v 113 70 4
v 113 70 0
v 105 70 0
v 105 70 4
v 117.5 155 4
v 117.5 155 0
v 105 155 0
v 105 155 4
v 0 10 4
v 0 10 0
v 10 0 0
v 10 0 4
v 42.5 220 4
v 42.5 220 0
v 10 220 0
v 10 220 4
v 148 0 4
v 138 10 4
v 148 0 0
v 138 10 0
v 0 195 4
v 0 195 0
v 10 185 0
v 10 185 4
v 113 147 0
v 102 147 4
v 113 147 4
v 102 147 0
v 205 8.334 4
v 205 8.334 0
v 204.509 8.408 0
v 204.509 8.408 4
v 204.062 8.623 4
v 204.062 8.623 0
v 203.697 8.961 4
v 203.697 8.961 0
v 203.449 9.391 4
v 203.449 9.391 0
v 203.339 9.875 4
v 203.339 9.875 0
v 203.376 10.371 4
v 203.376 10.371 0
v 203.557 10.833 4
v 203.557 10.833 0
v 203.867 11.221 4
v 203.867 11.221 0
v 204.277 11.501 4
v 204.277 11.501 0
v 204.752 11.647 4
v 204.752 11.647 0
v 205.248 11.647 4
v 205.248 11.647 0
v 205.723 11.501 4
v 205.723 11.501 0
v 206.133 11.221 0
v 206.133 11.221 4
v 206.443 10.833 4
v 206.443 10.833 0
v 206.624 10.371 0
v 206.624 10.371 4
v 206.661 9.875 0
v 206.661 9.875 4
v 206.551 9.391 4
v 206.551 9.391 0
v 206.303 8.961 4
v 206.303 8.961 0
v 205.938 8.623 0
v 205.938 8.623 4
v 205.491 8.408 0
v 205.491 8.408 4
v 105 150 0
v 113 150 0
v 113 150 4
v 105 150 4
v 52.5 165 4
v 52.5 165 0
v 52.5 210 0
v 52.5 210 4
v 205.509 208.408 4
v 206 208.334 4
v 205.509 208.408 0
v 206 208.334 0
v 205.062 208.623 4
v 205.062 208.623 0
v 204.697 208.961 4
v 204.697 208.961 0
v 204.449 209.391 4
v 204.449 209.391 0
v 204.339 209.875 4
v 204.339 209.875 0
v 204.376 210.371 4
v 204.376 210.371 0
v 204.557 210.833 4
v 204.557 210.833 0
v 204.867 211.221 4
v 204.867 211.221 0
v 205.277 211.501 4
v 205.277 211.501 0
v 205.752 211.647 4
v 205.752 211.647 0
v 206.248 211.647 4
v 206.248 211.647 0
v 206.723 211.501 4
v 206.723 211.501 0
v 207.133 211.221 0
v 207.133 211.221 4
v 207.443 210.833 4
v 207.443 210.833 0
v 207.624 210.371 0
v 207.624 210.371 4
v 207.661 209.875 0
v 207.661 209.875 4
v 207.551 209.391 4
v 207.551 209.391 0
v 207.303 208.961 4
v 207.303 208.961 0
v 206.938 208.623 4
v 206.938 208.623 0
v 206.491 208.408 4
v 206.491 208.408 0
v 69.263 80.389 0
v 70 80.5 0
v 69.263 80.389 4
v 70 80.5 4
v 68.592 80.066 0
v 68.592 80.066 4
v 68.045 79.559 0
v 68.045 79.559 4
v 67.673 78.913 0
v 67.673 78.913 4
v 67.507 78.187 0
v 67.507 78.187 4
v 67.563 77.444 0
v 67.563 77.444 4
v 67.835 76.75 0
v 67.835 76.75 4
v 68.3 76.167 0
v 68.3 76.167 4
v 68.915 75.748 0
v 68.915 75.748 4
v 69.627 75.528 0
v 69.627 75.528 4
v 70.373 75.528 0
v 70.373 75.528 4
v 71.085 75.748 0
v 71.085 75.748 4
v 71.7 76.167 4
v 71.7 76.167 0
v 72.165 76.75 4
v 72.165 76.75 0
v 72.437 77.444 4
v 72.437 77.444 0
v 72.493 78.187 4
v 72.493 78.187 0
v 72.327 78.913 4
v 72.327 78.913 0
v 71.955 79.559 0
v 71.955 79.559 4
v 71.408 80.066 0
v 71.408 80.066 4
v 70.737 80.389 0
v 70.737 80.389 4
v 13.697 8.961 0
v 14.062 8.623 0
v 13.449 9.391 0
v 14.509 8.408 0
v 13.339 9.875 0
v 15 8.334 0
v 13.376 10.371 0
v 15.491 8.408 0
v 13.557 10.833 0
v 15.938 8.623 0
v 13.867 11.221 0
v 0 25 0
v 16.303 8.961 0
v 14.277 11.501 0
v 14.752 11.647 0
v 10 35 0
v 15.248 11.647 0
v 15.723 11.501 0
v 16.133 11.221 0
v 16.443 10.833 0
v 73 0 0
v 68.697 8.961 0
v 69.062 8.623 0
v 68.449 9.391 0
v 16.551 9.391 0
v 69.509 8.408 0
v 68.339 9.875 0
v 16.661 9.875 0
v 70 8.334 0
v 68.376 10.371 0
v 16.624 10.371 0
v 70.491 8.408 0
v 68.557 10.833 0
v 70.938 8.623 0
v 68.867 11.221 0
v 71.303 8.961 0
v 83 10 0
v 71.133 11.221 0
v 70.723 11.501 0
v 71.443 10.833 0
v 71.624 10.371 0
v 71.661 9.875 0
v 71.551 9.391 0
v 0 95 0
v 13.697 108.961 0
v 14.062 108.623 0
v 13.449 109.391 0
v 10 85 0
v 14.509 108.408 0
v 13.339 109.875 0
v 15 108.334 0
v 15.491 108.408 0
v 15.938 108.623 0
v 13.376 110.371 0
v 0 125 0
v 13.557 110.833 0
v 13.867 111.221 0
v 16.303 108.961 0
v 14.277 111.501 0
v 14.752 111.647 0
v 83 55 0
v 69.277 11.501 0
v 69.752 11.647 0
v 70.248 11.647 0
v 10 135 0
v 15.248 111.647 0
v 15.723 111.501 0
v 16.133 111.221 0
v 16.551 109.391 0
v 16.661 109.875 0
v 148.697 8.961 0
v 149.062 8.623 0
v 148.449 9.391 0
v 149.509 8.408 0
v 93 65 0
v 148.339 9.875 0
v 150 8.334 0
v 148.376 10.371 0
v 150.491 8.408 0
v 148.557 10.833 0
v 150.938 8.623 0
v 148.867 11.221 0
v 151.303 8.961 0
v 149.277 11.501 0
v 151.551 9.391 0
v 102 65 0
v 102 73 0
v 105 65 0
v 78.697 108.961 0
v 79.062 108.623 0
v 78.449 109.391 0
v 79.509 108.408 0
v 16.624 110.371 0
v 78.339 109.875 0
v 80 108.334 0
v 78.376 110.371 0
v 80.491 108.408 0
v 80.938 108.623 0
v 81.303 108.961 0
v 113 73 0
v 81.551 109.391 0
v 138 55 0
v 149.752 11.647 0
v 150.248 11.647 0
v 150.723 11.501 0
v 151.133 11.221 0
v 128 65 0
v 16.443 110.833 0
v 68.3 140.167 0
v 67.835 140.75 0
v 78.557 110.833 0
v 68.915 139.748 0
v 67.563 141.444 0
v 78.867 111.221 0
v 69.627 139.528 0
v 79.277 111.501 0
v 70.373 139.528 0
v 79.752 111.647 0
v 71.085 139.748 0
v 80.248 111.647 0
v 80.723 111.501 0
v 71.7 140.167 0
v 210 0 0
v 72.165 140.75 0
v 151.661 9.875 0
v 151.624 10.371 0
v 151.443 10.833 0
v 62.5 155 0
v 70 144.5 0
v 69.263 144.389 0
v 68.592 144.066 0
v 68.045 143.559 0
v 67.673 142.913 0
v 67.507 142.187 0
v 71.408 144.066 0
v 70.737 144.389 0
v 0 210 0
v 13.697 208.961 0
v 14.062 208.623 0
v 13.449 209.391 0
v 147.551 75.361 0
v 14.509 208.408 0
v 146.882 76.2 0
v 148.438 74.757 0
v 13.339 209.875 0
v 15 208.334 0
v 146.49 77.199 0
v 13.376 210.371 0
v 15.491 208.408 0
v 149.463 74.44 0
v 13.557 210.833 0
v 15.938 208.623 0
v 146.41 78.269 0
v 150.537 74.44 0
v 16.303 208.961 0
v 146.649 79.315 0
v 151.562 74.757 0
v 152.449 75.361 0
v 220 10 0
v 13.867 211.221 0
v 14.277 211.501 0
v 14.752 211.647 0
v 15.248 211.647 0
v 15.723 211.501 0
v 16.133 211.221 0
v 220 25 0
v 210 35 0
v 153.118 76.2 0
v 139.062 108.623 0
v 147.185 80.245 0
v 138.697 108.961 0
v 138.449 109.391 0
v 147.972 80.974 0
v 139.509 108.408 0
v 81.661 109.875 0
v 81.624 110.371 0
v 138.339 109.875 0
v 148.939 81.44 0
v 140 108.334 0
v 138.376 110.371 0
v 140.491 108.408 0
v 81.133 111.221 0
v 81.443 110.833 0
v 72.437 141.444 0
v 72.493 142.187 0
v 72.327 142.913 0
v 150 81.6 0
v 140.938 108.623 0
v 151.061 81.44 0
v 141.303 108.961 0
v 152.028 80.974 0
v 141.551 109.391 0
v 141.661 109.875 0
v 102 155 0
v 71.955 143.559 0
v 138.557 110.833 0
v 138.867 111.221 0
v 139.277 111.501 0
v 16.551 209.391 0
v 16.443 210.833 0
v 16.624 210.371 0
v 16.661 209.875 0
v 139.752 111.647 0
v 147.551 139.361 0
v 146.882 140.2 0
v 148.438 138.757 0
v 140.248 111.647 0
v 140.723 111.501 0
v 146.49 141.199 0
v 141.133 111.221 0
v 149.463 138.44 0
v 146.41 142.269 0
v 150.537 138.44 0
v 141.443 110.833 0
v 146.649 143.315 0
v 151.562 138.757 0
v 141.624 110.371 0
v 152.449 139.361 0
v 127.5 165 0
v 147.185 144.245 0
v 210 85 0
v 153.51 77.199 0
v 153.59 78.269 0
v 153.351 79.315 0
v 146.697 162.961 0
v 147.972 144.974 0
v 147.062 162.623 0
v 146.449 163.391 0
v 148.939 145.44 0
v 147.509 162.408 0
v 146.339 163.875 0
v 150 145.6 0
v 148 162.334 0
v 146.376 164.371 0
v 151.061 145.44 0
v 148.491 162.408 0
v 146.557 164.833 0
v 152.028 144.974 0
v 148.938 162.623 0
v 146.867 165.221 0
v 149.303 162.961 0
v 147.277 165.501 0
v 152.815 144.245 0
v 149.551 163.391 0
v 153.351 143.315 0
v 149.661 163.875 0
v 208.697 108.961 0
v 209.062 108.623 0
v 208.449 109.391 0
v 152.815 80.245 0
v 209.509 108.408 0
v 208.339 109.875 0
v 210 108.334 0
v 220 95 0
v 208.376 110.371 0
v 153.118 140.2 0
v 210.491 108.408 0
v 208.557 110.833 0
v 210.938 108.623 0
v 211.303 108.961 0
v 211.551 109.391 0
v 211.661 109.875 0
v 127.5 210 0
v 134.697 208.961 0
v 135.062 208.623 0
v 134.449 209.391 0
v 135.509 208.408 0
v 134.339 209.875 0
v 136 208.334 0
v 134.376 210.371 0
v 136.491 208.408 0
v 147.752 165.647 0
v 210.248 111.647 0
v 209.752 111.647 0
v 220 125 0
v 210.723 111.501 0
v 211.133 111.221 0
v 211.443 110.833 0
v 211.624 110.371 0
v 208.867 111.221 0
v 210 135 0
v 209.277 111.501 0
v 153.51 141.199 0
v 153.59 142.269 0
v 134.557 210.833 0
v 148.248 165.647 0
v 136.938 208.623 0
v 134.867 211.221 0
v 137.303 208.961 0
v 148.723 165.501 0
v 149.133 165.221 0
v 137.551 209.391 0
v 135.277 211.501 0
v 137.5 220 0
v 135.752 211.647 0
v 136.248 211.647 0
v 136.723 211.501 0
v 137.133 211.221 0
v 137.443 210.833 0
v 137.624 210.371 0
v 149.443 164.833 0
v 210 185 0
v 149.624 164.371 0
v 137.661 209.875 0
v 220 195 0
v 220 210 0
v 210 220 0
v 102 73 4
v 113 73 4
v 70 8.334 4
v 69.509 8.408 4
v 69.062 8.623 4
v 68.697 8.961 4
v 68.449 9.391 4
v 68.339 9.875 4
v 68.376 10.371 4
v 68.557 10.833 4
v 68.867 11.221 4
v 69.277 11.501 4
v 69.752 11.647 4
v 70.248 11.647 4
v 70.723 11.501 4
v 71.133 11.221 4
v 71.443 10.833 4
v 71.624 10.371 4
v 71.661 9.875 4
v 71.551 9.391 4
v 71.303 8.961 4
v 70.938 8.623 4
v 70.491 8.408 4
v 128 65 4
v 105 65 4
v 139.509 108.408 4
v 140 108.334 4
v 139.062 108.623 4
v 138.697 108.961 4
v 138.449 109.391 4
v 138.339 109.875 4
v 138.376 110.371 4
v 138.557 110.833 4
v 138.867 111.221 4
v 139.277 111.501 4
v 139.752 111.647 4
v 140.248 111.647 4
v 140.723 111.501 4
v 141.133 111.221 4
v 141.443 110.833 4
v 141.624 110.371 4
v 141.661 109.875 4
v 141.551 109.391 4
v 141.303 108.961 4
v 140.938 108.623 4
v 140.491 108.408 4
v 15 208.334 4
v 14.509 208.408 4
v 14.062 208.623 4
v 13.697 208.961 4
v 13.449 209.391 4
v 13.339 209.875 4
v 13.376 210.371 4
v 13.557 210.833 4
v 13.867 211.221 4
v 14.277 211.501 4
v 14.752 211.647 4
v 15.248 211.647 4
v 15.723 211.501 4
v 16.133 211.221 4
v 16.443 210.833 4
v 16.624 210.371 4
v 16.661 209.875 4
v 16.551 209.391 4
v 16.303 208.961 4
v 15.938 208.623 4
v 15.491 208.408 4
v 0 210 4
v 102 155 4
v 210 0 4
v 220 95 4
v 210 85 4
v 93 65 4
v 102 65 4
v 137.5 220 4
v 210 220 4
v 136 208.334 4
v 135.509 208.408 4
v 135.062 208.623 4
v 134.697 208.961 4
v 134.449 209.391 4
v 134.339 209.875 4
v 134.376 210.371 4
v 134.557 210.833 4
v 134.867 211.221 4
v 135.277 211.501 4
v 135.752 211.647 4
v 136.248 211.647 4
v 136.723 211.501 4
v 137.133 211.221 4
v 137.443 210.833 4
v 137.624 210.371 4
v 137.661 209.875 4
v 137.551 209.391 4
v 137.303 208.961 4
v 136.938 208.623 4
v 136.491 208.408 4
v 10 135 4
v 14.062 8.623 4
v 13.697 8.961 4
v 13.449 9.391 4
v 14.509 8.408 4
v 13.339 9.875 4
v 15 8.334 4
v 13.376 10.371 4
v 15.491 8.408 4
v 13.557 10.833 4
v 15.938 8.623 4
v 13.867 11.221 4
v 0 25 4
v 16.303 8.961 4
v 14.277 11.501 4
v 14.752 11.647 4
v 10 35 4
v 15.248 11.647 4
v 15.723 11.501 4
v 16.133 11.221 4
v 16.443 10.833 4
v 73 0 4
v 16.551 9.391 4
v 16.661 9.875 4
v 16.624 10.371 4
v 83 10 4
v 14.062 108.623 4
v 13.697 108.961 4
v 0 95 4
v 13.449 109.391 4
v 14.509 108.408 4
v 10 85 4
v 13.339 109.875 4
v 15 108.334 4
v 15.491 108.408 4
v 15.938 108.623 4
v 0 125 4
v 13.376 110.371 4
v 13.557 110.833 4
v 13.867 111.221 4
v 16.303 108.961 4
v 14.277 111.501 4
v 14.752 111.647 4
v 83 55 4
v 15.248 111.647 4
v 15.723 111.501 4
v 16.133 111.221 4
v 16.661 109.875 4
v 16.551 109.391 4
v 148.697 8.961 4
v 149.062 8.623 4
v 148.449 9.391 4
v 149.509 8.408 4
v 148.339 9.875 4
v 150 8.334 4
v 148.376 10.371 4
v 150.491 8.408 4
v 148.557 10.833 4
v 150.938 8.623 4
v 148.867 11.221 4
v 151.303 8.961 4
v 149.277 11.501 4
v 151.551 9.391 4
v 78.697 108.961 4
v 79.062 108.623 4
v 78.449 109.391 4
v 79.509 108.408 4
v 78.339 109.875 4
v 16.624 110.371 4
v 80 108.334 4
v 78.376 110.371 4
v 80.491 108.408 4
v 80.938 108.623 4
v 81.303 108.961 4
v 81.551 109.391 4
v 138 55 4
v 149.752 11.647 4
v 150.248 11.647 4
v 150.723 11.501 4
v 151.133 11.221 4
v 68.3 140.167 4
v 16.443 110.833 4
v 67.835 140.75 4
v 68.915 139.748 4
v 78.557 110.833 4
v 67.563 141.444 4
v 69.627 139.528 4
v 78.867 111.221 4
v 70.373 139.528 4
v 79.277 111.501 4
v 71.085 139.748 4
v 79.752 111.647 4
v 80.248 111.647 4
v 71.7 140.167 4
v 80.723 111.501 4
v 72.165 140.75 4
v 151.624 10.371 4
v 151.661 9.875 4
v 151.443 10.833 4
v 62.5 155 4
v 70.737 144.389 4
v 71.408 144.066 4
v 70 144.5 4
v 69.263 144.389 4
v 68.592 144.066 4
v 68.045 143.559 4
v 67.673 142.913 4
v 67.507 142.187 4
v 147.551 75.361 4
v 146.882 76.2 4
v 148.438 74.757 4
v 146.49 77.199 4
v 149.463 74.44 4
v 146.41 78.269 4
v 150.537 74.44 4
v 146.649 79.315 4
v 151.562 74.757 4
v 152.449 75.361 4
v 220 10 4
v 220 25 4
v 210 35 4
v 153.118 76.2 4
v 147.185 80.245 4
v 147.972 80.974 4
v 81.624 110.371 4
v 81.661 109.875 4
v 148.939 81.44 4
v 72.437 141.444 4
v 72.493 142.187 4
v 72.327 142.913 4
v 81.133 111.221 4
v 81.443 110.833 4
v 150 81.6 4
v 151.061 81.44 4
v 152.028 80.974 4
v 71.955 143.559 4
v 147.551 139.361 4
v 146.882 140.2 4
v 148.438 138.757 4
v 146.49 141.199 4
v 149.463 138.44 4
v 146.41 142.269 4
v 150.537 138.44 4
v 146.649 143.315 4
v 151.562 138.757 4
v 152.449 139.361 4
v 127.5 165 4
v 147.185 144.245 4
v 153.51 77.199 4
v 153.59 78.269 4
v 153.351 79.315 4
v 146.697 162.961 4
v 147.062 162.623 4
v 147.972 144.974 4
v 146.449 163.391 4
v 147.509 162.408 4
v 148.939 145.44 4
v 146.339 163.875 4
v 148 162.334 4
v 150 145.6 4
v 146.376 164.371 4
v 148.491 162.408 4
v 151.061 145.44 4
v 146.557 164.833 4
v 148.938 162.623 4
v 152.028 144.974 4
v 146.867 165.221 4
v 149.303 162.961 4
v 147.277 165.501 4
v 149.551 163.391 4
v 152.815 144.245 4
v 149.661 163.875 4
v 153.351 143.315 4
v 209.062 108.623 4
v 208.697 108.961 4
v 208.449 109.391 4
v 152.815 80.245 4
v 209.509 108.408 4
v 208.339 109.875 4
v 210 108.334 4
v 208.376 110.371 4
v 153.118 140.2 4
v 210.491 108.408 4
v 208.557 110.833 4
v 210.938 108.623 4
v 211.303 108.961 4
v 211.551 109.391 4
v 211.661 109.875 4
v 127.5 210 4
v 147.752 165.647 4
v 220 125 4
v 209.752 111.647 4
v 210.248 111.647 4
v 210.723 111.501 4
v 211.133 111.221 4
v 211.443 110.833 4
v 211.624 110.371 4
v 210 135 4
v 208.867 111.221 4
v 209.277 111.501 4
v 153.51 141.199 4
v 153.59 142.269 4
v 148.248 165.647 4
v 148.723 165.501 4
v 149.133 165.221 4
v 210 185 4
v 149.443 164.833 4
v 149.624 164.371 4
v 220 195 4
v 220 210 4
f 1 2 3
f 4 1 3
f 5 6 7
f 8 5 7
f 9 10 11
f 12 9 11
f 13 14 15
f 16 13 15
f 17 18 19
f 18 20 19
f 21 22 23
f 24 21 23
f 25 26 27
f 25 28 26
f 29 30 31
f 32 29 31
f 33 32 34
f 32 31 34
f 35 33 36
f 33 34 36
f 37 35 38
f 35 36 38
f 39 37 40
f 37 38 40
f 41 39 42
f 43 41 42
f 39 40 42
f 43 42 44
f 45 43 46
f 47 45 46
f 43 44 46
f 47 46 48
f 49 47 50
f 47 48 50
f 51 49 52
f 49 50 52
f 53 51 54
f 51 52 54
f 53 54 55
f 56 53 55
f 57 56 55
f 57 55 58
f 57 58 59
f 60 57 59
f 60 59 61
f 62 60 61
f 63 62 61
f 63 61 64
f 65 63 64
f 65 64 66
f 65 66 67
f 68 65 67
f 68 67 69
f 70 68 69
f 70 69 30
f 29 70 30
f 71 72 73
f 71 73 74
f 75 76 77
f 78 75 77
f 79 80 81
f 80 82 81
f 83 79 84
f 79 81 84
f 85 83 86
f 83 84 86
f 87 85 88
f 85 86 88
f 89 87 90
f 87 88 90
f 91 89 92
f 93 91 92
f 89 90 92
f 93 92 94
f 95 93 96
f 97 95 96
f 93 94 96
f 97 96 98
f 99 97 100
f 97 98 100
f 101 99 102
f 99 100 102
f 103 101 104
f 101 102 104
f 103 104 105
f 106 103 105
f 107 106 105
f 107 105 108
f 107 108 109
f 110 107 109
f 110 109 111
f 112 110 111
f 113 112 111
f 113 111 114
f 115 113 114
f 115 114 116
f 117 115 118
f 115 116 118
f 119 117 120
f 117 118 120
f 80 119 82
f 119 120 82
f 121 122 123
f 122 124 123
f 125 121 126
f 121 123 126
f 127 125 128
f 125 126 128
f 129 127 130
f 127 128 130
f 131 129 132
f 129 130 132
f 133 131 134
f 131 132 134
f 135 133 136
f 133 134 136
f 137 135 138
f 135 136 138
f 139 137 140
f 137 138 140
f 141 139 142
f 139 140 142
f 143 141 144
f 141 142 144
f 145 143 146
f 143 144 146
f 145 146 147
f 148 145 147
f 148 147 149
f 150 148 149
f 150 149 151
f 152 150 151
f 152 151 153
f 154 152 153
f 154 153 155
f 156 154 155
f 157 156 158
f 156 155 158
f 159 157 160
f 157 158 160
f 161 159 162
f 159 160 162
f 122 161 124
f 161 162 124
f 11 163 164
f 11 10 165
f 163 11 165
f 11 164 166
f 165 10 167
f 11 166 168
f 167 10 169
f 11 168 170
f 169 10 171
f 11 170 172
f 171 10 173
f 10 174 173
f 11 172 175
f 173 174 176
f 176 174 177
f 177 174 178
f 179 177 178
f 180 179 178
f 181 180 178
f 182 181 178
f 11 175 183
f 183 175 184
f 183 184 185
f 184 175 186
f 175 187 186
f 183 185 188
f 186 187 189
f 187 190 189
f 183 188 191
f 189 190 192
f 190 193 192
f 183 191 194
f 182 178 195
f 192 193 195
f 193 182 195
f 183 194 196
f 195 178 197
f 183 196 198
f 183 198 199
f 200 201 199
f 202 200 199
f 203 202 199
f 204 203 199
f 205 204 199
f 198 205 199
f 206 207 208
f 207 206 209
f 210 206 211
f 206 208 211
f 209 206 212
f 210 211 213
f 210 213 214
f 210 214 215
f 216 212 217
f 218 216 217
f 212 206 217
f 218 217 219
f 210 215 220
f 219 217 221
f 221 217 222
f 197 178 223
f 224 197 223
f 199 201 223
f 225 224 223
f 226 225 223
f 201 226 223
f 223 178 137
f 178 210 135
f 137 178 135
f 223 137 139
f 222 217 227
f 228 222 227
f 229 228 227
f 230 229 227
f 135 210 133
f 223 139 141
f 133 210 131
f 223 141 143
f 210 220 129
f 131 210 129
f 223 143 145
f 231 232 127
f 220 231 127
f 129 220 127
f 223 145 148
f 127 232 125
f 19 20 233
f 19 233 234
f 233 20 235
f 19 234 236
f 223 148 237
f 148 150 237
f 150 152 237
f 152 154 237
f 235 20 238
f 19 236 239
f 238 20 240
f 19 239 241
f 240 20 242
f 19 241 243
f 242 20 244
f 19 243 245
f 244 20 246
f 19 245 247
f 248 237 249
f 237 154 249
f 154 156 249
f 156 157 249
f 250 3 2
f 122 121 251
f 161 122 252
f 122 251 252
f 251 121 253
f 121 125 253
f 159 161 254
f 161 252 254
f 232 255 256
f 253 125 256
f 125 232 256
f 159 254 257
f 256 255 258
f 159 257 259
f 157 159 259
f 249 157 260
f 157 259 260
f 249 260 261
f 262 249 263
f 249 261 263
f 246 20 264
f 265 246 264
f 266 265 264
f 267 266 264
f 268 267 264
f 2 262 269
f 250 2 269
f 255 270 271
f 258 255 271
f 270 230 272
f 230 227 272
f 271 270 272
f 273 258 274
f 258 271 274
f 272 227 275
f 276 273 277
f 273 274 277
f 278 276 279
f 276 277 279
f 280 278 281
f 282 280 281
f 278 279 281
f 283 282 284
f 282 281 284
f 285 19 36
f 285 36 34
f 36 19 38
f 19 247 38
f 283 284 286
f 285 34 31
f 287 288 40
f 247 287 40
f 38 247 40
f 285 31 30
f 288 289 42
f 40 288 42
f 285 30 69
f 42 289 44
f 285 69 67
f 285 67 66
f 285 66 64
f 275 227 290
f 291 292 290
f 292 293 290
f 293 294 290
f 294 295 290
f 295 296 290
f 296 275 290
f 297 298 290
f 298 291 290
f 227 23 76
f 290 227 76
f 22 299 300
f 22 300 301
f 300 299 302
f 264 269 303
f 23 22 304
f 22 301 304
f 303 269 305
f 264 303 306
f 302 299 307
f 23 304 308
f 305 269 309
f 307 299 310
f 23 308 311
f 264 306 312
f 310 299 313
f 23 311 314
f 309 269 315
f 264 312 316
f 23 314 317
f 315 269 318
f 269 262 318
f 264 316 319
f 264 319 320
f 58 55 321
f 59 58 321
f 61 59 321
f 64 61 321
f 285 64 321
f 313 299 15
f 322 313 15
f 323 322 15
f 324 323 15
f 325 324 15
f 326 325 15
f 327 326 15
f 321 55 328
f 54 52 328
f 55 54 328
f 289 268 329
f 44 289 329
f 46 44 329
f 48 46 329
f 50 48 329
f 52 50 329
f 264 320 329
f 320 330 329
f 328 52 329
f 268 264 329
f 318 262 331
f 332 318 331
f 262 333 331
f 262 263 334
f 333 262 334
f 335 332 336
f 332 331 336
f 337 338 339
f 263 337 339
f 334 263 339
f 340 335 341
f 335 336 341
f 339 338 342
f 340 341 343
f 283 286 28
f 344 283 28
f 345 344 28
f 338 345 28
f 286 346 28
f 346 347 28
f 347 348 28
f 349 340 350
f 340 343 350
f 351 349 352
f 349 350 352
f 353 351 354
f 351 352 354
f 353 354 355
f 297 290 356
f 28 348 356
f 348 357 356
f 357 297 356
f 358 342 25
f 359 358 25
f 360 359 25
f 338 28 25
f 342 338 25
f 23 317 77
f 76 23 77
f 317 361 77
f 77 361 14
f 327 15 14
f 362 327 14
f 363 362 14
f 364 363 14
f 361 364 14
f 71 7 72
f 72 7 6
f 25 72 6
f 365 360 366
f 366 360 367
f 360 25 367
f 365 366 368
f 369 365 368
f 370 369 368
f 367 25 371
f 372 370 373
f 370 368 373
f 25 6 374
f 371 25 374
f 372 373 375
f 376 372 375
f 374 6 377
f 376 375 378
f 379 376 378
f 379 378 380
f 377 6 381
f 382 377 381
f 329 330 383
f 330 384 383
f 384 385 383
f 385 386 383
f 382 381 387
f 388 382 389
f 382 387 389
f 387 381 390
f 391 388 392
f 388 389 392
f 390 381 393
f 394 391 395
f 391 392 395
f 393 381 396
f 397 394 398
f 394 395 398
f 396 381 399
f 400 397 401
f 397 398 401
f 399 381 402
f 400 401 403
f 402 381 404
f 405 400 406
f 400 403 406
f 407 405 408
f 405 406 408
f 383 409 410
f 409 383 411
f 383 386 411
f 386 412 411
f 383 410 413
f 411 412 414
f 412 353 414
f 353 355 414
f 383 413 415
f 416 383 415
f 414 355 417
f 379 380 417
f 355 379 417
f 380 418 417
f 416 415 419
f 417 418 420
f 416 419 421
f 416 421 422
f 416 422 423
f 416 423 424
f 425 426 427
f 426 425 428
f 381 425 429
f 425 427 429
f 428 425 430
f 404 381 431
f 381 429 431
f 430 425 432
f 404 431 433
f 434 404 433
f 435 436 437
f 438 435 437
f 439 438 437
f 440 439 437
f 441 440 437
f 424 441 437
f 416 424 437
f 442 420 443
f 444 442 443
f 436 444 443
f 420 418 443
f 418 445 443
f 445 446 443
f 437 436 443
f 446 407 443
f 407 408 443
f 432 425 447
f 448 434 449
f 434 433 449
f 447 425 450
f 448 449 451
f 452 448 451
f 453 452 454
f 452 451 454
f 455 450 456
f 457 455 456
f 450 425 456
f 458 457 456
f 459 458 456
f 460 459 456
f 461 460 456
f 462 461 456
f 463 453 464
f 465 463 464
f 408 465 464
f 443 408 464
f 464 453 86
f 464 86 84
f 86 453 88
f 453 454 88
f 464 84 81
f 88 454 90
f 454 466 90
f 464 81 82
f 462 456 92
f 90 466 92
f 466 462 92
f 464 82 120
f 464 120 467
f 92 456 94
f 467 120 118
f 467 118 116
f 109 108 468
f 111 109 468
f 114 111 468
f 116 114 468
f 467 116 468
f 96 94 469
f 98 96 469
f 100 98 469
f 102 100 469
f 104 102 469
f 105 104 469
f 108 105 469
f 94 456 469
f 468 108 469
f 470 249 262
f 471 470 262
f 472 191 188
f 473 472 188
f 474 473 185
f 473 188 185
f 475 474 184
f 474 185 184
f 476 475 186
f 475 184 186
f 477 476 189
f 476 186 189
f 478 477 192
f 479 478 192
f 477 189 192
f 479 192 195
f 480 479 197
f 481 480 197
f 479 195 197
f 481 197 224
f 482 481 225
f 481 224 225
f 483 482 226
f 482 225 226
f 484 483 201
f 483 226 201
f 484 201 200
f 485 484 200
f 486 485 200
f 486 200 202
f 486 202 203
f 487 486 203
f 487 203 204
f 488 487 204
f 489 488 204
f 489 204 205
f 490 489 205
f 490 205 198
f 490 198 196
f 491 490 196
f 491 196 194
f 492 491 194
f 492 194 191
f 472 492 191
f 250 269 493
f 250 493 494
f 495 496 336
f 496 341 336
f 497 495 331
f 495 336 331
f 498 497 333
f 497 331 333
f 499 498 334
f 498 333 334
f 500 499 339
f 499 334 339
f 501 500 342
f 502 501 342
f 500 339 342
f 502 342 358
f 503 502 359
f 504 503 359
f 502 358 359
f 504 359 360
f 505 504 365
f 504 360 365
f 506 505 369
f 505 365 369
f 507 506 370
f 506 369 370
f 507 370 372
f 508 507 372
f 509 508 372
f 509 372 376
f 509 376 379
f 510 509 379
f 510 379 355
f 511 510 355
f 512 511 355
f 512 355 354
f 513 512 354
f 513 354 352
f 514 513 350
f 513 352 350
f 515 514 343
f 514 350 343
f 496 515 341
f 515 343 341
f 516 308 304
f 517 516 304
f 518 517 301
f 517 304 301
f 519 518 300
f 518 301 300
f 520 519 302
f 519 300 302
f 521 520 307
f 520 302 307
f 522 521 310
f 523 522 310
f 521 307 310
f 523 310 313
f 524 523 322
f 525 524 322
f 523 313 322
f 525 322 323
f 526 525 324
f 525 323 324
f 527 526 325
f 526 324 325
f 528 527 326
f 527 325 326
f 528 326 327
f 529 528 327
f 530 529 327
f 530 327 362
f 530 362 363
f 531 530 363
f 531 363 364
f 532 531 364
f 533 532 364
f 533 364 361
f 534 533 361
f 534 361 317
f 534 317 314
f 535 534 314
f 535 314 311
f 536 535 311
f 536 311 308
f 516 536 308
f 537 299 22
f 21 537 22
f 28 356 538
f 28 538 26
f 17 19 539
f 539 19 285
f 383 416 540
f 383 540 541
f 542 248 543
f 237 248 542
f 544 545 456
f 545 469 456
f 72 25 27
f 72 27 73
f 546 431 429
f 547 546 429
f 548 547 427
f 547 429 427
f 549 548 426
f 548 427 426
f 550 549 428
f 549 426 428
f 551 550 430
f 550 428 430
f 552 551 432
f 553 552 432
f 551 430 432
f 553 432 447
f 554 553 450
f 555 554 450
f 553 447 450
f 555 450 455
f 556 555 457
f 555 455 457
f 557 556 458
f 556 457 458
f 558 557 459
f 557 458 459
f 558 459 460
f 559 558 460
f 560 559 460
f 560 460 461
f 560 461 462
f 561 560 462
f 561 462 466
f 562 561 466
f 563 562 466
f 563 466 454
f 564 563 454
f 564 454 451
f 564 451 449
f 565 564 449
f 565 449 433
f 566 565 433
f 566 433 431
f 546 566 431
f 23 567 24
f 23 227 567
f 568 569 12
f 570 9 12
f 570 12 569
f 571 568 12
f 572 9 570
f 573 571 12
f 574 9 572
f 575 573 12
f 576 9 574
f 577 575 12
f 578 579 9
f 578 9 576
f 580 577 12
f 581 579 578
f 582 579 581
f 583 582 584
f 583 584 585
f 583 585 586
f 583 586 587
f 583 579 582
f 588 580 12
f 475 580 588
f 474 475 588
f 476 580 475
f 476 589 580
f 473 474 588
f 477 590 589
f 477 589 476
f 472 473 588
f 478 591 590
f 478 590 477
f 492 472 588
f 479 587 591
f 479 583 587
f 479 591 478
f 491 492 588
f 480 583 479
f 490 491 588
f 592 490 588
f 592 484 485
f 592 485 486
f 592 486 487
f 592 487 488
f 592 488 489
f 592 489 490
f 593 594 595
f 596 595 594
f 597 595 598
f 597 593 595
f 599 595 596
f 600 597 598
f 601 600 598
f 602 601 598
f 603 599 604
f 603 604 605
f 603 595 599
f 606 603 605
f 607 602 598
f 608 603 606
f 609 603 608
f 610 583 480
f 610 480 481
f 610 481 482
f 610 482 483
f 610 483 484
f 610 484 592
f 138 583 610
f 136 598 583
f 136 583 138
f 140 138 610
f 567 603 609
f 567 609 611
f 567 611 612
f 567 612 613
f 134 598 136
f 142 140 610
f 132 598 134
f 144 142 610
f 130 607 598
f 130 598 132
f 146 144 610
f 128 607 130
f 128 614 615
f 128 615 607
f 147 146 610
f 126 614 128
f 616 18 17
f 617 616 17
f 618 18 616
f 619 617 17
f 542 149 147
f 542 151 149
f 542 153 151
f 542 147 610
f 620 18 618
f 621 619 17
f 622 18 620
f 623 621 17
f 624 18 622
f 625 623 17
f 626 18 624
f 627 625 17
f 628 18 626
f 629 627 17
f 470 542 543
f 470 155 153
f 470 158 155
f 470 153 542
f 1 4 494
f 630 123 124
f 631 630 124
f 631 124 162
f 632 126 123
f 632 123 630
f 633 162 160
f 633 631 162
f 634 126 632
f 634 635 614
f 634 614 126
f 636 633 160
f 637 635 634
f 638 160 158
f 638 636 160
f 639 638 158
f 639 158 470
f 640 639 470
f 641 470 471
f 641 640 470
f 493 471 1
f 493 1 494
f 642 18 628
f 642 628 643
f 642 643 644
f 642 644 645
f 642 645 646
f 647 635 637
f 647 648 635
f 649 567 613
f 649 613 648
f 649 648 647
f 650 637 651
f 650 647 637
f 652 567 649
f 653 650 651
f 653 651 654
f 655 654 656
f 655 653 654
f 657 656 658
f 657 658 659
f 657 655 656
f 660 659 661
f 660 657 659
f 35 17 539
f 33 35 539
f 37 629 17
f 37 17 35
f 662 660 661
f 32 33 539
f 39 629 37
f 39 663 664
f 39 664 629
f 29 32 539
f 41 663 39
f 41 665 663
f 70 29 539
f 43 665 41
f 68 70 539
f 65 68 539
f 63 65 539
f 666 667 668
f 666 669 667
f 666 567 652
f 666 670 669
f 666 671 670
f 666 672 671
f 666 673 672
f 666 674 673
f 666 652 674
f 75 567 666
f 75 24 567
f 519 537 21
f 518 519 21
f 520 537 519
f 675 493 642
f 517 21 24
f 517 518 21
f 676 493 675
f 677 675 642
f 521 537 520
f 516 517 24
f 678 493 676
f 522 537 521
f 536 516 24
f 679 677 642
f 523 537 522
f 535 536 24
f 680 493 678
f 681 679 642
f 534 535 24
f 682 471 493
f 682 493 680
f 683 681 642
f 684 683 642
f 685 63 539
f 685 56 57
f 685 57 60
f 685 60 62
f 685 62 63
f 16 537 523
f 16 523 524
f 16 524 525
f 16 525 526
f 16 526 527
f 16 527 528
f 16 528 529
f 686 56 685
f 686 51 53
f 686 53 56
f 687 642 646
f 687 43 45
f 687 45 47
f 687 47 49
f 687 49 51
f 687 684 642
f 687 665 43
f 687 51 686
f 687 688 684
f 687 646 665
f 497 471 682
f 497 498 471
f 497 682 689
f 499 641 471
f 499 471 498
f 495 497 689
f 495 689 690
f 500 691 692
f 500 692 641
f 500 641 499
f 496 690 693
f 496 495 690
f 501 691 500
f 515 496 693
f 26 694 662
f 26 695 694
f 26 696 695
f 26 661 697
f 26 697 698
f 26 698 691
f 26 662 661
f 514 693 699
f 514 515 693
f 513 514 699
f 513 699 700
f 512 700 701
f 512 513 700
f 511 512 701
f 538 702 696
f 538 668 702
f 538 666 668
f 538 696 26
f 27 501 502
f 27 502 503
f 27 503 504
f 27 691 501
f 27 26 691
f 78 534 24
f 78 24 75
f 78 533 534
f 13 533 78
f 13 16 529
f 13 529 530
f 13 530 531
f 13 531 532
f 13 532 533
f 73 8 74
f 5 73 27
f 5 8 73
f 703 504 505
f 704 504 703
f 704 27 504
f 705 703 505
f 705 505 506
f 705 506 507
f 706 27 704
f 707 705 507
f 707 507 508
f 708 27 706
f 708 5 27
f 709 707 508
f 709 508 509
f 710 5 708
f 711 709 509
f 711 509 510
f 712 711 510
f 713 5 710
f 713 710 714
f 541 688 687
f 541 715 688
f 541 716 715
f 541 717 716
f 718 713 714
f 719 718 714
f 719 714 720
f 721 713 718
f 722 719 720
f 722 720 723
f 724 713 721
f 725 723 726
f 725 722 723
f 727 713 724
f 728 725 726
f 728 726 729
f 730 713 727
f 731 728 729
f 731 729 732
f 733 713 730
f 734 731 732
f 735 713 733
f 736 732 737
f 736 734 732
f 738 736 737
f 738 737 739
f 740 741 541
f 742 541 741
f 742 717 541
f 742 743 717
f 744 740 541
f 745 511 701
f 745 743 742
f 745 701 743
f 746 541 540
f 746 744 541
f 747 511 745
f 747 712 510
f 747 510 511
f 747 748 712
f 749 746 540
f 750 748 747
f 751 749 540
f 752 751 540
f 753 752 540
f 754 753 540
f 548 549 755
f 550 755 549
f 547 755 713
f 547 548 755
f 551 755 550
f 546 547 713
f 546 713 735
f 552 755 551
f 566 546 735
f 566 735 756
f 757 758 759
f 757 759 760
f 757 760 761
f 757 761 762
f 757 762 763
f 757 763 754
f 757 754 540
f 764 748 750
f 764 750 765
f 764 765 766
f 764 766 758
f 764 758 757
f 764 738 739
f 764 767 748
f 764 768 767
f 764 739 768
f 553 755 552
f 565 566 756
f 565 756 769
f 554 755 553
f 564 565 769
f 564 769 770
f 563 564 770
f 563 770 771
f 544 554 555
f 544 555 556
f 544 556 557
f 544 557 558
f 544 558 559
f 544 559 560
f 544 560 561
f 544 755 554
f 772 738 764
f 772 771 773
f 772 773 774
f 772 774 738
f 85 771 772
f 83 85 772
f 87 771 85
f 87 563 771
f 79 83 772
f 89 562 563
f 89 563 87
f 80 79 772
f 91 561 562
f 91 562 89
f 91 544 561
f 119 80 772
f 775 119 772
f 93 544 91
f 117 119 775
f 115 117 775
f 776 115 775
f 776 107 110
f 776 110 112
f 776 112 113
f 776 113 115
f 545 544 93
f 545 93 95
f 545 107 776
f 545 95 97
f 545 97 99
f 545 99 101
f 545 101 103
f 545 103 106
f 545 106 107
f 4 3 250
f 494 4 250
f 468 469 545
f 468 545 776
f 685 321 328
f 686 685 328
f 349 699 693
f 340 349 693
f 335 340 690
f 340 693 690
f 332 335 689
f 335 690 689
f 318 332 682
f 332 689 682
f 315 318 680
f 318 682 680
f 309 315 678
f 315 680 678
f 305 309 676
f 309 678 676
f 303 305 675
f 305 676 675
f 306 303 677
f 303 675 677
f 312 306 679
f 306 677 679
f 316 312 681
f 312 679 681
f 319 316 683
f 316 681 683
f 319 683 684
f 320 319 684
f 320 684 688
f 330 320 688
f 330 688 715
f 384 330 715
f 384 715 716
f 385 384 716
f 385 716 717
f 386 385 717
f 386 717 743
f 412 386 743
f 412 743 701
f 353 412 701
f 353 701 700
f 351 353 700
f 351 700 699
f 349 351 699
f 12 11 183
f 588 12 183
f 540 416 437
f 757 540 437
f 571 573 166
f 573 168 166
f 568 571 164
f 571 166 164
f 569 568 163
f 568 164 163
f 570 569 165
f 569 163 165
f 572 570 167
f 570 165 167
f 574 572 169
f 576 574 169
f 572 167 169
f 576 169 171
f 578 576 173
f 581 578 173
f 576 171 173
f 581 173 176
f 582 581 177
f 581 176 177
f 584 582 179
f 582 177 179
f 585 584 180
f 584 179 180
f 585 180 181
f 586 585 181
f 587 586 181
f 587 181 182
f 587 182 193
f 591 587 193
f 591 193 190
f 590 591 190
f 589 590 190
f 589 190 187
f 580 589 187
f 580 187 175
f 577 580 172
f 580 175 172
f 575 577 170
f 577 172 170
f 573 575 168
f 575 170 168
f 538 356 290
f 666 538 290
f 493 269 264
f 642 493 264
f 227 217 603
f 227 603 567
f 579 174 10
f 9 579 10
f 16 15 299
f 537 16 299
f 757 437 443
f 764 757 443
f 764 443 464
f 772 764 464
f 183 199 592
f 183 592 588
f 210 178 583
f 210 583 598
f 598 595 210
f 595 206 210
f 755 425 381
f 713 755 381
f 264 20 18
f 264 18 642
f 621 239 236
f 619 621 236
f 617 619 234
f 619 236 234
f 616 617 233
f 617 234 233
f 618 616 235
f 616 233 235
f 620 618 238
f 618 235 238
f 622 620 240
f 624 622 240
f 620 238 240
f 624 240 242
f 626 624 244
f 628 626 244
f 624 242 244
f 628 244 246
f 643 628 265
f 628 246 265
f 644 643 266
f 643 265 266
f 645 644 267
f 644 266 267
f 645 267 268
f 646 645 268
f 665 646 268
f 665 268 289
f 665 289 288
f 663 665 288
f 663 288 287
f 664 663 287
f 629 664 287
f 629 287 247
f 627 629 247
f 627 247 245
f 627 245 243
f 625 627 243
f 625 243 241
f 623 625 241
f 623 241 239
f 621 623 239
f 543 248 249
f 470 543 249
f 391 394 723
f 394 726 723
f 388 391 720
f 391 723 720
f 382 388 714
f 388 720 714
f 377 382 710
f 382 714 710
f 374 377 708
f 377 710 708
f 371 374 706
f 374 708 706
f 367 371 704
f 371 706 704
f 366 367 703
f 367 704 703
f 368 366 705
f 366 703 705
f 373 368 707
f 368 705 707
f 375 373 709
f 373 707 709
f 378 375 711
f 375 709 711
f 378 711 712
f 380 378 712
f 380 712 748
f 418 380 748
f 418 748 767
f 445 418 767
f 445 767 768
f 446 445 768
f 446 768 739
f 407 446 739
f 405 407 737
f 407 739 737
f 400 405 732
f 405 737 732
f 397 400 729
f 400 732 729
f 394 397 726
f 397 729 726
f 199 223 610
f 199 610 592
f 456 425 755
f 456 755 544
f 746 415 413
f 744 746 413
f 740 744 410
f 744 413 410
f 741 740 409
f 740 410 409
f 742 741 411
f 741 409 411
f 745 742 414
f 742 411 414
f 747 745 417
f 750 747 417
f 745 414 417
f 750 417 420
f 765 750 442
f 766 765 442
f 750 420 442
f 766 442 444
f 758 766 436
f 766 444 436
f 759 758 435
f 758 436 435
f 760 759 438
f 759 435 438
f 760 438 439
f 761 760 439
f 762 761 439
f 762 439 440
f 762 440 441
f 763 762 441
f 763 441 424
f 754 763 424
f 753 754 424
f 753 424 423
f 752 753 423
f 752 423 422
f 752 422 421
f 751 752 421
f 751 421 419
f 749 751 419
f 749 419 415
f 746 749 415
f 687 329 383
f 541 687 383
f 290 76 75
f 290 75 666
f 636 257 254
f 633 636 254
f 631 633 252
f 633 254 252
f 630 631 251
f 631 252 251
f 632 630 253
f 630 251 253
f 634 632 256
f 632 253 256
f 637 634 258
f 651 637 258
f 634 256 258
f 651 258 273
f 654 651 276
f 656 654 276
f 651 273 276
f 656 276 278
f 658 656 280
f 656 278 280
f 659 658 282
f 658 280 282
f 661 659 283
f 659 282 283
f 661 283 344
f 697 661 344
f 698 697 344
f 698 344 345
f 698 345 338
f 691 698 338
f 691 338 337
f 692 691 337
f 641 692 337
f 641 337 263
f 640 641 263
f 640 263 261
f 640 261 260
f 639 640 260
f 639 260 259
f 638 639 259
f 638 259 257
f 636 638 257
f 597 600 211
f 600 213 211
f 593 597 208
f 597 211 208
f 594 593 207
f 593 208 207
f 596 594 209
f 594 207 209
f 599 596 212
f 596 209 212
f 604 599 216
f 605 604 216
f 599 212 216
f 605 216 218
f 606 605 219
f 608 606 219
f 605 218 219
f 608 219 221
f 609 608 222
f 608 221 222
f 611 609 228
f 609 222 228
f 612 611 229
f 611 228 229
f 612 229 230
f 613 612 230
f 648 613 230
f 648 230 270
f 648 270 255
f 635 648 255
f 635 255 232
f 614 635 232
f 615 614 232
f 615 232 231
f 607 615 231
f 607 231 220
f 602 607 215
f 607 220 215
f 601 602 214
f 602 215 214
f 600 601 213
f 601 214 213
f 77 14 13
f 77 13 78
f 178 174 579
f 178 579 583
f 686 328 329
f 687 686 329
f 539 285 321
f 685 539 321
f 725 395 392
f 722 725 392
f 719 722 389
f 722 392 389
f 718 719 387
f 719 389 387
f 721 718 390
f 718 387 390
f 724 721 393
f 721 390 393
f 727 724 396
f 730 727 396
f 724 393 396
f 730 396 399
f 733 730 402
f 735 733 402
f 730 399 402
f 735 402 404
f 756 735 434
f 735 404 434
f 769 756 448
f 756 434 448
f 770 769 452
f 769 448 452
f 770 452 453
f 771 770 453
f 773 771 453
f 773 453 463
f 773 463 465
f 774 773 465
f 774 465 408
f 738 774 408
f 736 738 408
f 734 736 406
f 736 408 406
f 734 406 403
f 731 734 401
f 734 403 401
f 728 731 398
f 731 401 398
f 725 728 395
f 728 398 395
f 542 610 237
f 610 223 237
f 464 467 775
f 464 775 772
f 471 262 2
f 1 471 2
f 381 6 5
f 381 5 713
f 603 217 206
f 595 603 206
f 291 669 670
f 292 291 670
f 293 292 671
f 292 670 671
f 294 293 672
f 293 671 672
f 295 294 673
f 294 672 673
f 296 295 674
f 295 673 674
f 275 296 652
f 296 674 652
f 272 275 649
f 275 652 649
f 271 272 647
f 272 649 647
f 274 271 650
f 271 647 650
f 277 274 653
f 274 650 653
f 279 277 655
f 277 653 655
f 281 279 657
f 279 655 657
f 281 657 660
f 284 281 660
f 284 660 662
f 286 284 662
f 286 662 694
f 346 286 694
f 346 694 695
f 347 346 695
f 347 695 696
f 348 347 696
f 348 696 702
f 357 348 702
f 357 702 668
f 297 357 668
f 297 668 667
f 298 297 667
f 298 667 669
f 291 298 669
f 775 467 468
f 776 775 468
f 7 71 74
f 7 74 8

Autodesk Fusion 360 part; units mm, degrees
sketch "Sketch1" plane through (0, 0, 0) normal (0, 0, 1) x (1, 0, 0)
  line L0 (10, 0) -> (210, 0)
  line L1 (220, 10) -> (220, 210)
  line L2 (210, 220) -> (10, 220)
  line L3 (0, 210) -> (0, 10)
  line L4 (83, 0) -> (138, 0)
  line L5 (138, 0) -> (138, 55)
  line L6 (128, 65) -> (93, 65)
  line L7 (83, 55) -> (83, 0)
  line L8 (52.5, 220) -> (127.5, 220)
  line L9 (127.5, 220) -> (127.5, 165)
  line L10 (117.5, 155) -> (62.5, 155)
  line L11 (52.5, 165) -> (52.5, 220)
  line L12 (52.5, 165) -> (62.5, 155)
  line L13 (117.5, 155) -> (127.5, 165)
  line L14 (83, 55) -> (93, 65)
  line L15 (128, 65) -> (138, 55)
  line L16 (0, 25) -> (10, 25)
  line L17 (10, 25) -> (10, 95)
  line L18 (10, 95) -> (0, 95)
  line L19 (0, 95) -> (0, 25)
  line L20 (0, 125) -> (10, 125)
  line L21 (10, 125) -> (10, 195)
  line L22 (10, 195) -> (0, 195)
  line L23 (0, 195) -> (0, 125)
  line L24 (10, 220) -> (0, 210)
  line L25 (210, 220) -> (220, 210)
  line L26 (0, 10) -> (10, 0)
  line L27 (210, 0) -> (220, 10)
  line L28 (0, 95) -> (10, 85)
  line L29 (0, 125) -> (10, 135)
  line L30 (0, 195) -> (10, 185)
  line L31 (0, 25) -> (10, 35)
  line L32 (110, 0) -> (110, 220) construction
  line L33 (210, 195) -> (220, 195)
  line L34 (220, 195) -> (210, 185)
  line L35 (210, 125) -> (210, 195)
  line L36 (220, 125) -> (210, 135)
  line L37 (220, 125) -> (210, 125)
  line L38 (210, 95) -> (220, 95)
  line L39 (210, 25) -> (210, 95)
  line L40 (220, 95) -> (210, 85)
  line L41 (220, 25) -> (210, 25)
  line L42 (220, 25) -> (210, 35)
  line L43 (0, 110) -> (220, 110) construction
  line L44 (150, 142) -> (70, 142) construction
  line L45 (70, 142) -> (70, 78) construction
  line L46 (70, 78) -> (150, 78) construction
  line L47 (150, 78) -> (150, 142) construction
  line L48 (150, 142) -> (70, 78) construction
  line L49 (70, 142) -> (150, 78) construction
  line L50 (102, 65) -> (102, 73)
  line L51 (102, 73) -> (113, 73)
  line L52 (113, 73) -> (113, 70)
  line L53 (113, 70) -> (105, 70)
  line L54 (105, 70) -> (105, 65)
  line L55 (102, 155) -> (102, 147)
  line L56 (102, 147) -> (113, 147)
  line L57 (113, 150) -> (105, 150)
  line L58 (113, 147) -> (113, 150)
  line L59 (105, 150) -> (105, 155)
  line L60 (42.5, 220) -> (52.5, 210)
  line L61 (127.5, 210) -> (137.5, 220)
  line L62 (138, 10) -> (148, 0)
  line L63 (83, 10) -> (73, 0)
  point P0 (220, 0)
  point P1 (0, 220)
  point P2 (52.5, 155)
  point P3 (127.5, 155)
  point P4 (83, 65)
  point P5 (138, 65)
  point P6 (220, 220)
  point P7 (110, 110)
  point P8 (110, 110)
  dimension "d1" = 220
  dimension "d2" = 220
  dimension "d3" = 83
  dimension "d4" = 138
  dimension "d5" = 65
  dimension "d6" = 52.5
  dimension "d7" = 127.5
  dimension "d8" = 65
  dimension "d9" = 10
  dimension "d10" = 10
  dimension "d11" = 10
  dimension "d12" = 10
  dimension "d13" = 10
  dimension "d14" = 10
  dimension "d15" = 10
  dimension "d16" = 10
  dimension "d17" = 95
  dimension "d18" = 25
  dimension "d19" = 10
  dimension "d20" = 195
  dimension "d21" = 125
  dimension "d22" = 10
  dimension "d23" = 10
  dimension "d24" = 10
  dimension "d25" = 10
  dimension "d26" = 10
  dimension "d27" = 10
  dimension "d28" = 10
  dimension "d29" = 10
  dimension "d30" = 10
  dimension "d31" = 80
  dimension "d32" = 64
  dimension "d41" = 102
  dimension "d42" = 3
  dimension "d44" = 3
  dimension "d45" = 11
  dimension "d46" = 8
  dimension "d60" = 10
  dimension "d61" = 10
  dimension "d62" = 10
  dimension "d63" = 10
extrude "Extrude1" add sketch "Sketch1" along normal blind 4 contours L0 L1 L2 L3 L5 L6 L7 L9 L10 L11 L12 L13 L14 L15 L16 L17 L18 L20 L21 L22 L24 L25 L26 L27 L33 L35 L37 L38 L39 L41 L50 L51 L52 L53 L54 L55 L56 L57 L58 L59 L60 L61 L62 L63 | L16 L17 L31 | L17 L18 L28 | L20 L21 L29 | L21 L22 L30 | L39 L41 L42 | L38 L39 L40 | L35 L36 L37 | L33 L34 L35
hole "Hole1" at (70, 142, 0) at (70, 78, 0) direction (0, 0, 1) diameter 5 end through all
hole "Hole2" at (150, 78, 0) at (150, 142, 0) direction (0, 0, 1) diameter 7.2 depth 4 tip angle 118
sketch "Sketch2" plane through (0, 0, 4) normal (0, 0, 1) x (-1, 0, 0)
  circle A0 centre (-150, -78) radius 3.6
  circle A1 centre (-150, -142) radius 3.6
  circle A2 centre (-70, -142) radius 2.5
  circle A3 centre (-70, -78) radius 2.5
  line L0 (-102, -155) -> (-62.5, -155)
  line L1 (-62.5, -155) -> (-52.5, -165)
  line L2 (-52.5, -165) -> (-52.5, -210)
  line L3 (-42.5, -220) -> (-10, -220)
  line L4 (-10, -220) -> (0, -210)
  line L5 (0, -210) -> (0, -195)
  line L6 (0, -195) -> (-10, -185)
  line L7 (-10, -185) -> (-10, -135)
  line L8 (-10, -135) -> (0, -125)
  line L9 (0, -125) -> (0, -95)
  line L10 (0, -95) -> (-10, -85)
  line L11 (-10, -85) -> (-10, -35)
  line L12 (-10, -35) -> (0, -25)
  line L13 (0, -25) -> (0, -10)
  line L14 (0, -10) -> (-10, 0)
  line L15 (-10, 0) -> (-73, 0)
  line L16 (-83, -10) -> (-83, -55)
  line L17 (-83, -55) -> (-93, -65)
  line L18 (-93, -65) -> (-102, -65)
  line L19 (-102, -65) -> (-102, -73)
  line L20 (-102, -73) -> (-113, -73)
  line L21 (-113, -73) -> (-113, -70)
  line L22 (-113, -70) -> (-105, -70)
  line L23 (-105, -70) -> (-105, -65)
  line L24 (-105, -65) -> (-128, -65)
  line L25 (-128, -65) -> (-138, -55)
  line L26 (-138, -55) -> (-138, -10)
  line L27 (-148, 0) -> (-210, 0)
  line L28 (-210, 0) -> (-220, -10)
  line L29 (-220, -10) -> (-220, -25)
  line L30 (-220, -25) -> (-210, -35)
  line L31 (-210, -35) -> (-210, -85)
  line L32 (-210, -85) -> (-220, -95)
  line L33 (-220, -95) -> (-220, -125)
  line L34 (-220, -125) -> (-210, -135)
  line L35 (-210, -135) -> (-210, -185)
  line L36 (-210, -185) -> (-220, -195)
  line L37 (-220, -195) -> (-220, -210)
  line L38 (-220, -210) -> (-210, -220)
  line L39 (-210, -220) -> (-137.5, -220)
  line L40 (-127.5, -210) -> (-127.5, -165)
  line L41 (-127.5, -165) -> (-117.5, -155)
  line L42 (-117.5, -155) -> (-105, -155)
  line L43 (-105, -155) -> (-105, -150)
  line L44 (-105, -150) -> (-113, -150)
  line L45 (-113, -150) -> (-113, -147)
  line L46 (-113, -147) -> (-102, -147)
  line L47 (-102, -147) -> (-102, -155)
  line L48 (0, -110) -> (-220, -110) construction
  line L49 (-10, 0) -> (-210, 0) construction
  line L50 (0, -10) -> (-220, -10) construction
  line L51 (0, -210) -> (-220, -210) construction
  line L52 (-138, -10) -> (-148, 0)
  line L53 (-137.5, -220) -> (-127.5, -210)
  line L54 (-52.5, -210) -> (-42.5, -220)
  line L55 (-73, 0) -> (-83, -10)
  point P0 (-15, -110)
  point P1 (-80, -110)
  point P2 (-140, -110)
  point P3 (-210, -110)
  point P4 (-15, -210)
  point P5 (-136, -210)
  point P6 (-206, -210)
  point P7 (-15, -10)
  point P8 (-70, -10)
  point P9 (-150, -10)
  point P10 (-205, -10)
  point P11 (-148, -164)
  dimension "d47" = 110
  dimension "d48" = 10
  dimension "d49" = 15
  dimension "d50" = 80
  dimension "d51" = 140
  dimension "d52" = 210
  dimension "d53" = 15
  dimension "d54" = 136
  dimension "d55" = 206
  dimension "d56" = 15
  dimension "d57" = 70
  dimension "d58" = 150
  dimension "d59" = 205
  dimension "d70" = 148
  dimension "d71" = 164
hole "Hole3" at (15, 210, 4) at (136, 210, 4) at (206, 210, 4) at (210, 110, 4) at (140, 110, 4) at (80, 110, 4) at (15, 110, 4) at (15, 10, 4) at (70, 10, 4) at (150, 10, 4) at (205, 10, 4) direction (0, 0, -1) diameter 3.332 depth 4 tip angle 118
hole "Hole5" at (148, 164, 4) direction (0, 0, -1) diameter 3.332 depth 4 tip angle 118
ref_plane "WorkPlane1" through (110, 110, 2) normal (-1, 0, 0) x (0, -1, 0)
equation "d10 = d9"
equation "d12 = d11"
equation "d14 = d13"
equation "d16 = d15"
equation "d24 = d23"
equation "d26 = d25"
equation "d28 = d27"
equation "d30 = d29"
